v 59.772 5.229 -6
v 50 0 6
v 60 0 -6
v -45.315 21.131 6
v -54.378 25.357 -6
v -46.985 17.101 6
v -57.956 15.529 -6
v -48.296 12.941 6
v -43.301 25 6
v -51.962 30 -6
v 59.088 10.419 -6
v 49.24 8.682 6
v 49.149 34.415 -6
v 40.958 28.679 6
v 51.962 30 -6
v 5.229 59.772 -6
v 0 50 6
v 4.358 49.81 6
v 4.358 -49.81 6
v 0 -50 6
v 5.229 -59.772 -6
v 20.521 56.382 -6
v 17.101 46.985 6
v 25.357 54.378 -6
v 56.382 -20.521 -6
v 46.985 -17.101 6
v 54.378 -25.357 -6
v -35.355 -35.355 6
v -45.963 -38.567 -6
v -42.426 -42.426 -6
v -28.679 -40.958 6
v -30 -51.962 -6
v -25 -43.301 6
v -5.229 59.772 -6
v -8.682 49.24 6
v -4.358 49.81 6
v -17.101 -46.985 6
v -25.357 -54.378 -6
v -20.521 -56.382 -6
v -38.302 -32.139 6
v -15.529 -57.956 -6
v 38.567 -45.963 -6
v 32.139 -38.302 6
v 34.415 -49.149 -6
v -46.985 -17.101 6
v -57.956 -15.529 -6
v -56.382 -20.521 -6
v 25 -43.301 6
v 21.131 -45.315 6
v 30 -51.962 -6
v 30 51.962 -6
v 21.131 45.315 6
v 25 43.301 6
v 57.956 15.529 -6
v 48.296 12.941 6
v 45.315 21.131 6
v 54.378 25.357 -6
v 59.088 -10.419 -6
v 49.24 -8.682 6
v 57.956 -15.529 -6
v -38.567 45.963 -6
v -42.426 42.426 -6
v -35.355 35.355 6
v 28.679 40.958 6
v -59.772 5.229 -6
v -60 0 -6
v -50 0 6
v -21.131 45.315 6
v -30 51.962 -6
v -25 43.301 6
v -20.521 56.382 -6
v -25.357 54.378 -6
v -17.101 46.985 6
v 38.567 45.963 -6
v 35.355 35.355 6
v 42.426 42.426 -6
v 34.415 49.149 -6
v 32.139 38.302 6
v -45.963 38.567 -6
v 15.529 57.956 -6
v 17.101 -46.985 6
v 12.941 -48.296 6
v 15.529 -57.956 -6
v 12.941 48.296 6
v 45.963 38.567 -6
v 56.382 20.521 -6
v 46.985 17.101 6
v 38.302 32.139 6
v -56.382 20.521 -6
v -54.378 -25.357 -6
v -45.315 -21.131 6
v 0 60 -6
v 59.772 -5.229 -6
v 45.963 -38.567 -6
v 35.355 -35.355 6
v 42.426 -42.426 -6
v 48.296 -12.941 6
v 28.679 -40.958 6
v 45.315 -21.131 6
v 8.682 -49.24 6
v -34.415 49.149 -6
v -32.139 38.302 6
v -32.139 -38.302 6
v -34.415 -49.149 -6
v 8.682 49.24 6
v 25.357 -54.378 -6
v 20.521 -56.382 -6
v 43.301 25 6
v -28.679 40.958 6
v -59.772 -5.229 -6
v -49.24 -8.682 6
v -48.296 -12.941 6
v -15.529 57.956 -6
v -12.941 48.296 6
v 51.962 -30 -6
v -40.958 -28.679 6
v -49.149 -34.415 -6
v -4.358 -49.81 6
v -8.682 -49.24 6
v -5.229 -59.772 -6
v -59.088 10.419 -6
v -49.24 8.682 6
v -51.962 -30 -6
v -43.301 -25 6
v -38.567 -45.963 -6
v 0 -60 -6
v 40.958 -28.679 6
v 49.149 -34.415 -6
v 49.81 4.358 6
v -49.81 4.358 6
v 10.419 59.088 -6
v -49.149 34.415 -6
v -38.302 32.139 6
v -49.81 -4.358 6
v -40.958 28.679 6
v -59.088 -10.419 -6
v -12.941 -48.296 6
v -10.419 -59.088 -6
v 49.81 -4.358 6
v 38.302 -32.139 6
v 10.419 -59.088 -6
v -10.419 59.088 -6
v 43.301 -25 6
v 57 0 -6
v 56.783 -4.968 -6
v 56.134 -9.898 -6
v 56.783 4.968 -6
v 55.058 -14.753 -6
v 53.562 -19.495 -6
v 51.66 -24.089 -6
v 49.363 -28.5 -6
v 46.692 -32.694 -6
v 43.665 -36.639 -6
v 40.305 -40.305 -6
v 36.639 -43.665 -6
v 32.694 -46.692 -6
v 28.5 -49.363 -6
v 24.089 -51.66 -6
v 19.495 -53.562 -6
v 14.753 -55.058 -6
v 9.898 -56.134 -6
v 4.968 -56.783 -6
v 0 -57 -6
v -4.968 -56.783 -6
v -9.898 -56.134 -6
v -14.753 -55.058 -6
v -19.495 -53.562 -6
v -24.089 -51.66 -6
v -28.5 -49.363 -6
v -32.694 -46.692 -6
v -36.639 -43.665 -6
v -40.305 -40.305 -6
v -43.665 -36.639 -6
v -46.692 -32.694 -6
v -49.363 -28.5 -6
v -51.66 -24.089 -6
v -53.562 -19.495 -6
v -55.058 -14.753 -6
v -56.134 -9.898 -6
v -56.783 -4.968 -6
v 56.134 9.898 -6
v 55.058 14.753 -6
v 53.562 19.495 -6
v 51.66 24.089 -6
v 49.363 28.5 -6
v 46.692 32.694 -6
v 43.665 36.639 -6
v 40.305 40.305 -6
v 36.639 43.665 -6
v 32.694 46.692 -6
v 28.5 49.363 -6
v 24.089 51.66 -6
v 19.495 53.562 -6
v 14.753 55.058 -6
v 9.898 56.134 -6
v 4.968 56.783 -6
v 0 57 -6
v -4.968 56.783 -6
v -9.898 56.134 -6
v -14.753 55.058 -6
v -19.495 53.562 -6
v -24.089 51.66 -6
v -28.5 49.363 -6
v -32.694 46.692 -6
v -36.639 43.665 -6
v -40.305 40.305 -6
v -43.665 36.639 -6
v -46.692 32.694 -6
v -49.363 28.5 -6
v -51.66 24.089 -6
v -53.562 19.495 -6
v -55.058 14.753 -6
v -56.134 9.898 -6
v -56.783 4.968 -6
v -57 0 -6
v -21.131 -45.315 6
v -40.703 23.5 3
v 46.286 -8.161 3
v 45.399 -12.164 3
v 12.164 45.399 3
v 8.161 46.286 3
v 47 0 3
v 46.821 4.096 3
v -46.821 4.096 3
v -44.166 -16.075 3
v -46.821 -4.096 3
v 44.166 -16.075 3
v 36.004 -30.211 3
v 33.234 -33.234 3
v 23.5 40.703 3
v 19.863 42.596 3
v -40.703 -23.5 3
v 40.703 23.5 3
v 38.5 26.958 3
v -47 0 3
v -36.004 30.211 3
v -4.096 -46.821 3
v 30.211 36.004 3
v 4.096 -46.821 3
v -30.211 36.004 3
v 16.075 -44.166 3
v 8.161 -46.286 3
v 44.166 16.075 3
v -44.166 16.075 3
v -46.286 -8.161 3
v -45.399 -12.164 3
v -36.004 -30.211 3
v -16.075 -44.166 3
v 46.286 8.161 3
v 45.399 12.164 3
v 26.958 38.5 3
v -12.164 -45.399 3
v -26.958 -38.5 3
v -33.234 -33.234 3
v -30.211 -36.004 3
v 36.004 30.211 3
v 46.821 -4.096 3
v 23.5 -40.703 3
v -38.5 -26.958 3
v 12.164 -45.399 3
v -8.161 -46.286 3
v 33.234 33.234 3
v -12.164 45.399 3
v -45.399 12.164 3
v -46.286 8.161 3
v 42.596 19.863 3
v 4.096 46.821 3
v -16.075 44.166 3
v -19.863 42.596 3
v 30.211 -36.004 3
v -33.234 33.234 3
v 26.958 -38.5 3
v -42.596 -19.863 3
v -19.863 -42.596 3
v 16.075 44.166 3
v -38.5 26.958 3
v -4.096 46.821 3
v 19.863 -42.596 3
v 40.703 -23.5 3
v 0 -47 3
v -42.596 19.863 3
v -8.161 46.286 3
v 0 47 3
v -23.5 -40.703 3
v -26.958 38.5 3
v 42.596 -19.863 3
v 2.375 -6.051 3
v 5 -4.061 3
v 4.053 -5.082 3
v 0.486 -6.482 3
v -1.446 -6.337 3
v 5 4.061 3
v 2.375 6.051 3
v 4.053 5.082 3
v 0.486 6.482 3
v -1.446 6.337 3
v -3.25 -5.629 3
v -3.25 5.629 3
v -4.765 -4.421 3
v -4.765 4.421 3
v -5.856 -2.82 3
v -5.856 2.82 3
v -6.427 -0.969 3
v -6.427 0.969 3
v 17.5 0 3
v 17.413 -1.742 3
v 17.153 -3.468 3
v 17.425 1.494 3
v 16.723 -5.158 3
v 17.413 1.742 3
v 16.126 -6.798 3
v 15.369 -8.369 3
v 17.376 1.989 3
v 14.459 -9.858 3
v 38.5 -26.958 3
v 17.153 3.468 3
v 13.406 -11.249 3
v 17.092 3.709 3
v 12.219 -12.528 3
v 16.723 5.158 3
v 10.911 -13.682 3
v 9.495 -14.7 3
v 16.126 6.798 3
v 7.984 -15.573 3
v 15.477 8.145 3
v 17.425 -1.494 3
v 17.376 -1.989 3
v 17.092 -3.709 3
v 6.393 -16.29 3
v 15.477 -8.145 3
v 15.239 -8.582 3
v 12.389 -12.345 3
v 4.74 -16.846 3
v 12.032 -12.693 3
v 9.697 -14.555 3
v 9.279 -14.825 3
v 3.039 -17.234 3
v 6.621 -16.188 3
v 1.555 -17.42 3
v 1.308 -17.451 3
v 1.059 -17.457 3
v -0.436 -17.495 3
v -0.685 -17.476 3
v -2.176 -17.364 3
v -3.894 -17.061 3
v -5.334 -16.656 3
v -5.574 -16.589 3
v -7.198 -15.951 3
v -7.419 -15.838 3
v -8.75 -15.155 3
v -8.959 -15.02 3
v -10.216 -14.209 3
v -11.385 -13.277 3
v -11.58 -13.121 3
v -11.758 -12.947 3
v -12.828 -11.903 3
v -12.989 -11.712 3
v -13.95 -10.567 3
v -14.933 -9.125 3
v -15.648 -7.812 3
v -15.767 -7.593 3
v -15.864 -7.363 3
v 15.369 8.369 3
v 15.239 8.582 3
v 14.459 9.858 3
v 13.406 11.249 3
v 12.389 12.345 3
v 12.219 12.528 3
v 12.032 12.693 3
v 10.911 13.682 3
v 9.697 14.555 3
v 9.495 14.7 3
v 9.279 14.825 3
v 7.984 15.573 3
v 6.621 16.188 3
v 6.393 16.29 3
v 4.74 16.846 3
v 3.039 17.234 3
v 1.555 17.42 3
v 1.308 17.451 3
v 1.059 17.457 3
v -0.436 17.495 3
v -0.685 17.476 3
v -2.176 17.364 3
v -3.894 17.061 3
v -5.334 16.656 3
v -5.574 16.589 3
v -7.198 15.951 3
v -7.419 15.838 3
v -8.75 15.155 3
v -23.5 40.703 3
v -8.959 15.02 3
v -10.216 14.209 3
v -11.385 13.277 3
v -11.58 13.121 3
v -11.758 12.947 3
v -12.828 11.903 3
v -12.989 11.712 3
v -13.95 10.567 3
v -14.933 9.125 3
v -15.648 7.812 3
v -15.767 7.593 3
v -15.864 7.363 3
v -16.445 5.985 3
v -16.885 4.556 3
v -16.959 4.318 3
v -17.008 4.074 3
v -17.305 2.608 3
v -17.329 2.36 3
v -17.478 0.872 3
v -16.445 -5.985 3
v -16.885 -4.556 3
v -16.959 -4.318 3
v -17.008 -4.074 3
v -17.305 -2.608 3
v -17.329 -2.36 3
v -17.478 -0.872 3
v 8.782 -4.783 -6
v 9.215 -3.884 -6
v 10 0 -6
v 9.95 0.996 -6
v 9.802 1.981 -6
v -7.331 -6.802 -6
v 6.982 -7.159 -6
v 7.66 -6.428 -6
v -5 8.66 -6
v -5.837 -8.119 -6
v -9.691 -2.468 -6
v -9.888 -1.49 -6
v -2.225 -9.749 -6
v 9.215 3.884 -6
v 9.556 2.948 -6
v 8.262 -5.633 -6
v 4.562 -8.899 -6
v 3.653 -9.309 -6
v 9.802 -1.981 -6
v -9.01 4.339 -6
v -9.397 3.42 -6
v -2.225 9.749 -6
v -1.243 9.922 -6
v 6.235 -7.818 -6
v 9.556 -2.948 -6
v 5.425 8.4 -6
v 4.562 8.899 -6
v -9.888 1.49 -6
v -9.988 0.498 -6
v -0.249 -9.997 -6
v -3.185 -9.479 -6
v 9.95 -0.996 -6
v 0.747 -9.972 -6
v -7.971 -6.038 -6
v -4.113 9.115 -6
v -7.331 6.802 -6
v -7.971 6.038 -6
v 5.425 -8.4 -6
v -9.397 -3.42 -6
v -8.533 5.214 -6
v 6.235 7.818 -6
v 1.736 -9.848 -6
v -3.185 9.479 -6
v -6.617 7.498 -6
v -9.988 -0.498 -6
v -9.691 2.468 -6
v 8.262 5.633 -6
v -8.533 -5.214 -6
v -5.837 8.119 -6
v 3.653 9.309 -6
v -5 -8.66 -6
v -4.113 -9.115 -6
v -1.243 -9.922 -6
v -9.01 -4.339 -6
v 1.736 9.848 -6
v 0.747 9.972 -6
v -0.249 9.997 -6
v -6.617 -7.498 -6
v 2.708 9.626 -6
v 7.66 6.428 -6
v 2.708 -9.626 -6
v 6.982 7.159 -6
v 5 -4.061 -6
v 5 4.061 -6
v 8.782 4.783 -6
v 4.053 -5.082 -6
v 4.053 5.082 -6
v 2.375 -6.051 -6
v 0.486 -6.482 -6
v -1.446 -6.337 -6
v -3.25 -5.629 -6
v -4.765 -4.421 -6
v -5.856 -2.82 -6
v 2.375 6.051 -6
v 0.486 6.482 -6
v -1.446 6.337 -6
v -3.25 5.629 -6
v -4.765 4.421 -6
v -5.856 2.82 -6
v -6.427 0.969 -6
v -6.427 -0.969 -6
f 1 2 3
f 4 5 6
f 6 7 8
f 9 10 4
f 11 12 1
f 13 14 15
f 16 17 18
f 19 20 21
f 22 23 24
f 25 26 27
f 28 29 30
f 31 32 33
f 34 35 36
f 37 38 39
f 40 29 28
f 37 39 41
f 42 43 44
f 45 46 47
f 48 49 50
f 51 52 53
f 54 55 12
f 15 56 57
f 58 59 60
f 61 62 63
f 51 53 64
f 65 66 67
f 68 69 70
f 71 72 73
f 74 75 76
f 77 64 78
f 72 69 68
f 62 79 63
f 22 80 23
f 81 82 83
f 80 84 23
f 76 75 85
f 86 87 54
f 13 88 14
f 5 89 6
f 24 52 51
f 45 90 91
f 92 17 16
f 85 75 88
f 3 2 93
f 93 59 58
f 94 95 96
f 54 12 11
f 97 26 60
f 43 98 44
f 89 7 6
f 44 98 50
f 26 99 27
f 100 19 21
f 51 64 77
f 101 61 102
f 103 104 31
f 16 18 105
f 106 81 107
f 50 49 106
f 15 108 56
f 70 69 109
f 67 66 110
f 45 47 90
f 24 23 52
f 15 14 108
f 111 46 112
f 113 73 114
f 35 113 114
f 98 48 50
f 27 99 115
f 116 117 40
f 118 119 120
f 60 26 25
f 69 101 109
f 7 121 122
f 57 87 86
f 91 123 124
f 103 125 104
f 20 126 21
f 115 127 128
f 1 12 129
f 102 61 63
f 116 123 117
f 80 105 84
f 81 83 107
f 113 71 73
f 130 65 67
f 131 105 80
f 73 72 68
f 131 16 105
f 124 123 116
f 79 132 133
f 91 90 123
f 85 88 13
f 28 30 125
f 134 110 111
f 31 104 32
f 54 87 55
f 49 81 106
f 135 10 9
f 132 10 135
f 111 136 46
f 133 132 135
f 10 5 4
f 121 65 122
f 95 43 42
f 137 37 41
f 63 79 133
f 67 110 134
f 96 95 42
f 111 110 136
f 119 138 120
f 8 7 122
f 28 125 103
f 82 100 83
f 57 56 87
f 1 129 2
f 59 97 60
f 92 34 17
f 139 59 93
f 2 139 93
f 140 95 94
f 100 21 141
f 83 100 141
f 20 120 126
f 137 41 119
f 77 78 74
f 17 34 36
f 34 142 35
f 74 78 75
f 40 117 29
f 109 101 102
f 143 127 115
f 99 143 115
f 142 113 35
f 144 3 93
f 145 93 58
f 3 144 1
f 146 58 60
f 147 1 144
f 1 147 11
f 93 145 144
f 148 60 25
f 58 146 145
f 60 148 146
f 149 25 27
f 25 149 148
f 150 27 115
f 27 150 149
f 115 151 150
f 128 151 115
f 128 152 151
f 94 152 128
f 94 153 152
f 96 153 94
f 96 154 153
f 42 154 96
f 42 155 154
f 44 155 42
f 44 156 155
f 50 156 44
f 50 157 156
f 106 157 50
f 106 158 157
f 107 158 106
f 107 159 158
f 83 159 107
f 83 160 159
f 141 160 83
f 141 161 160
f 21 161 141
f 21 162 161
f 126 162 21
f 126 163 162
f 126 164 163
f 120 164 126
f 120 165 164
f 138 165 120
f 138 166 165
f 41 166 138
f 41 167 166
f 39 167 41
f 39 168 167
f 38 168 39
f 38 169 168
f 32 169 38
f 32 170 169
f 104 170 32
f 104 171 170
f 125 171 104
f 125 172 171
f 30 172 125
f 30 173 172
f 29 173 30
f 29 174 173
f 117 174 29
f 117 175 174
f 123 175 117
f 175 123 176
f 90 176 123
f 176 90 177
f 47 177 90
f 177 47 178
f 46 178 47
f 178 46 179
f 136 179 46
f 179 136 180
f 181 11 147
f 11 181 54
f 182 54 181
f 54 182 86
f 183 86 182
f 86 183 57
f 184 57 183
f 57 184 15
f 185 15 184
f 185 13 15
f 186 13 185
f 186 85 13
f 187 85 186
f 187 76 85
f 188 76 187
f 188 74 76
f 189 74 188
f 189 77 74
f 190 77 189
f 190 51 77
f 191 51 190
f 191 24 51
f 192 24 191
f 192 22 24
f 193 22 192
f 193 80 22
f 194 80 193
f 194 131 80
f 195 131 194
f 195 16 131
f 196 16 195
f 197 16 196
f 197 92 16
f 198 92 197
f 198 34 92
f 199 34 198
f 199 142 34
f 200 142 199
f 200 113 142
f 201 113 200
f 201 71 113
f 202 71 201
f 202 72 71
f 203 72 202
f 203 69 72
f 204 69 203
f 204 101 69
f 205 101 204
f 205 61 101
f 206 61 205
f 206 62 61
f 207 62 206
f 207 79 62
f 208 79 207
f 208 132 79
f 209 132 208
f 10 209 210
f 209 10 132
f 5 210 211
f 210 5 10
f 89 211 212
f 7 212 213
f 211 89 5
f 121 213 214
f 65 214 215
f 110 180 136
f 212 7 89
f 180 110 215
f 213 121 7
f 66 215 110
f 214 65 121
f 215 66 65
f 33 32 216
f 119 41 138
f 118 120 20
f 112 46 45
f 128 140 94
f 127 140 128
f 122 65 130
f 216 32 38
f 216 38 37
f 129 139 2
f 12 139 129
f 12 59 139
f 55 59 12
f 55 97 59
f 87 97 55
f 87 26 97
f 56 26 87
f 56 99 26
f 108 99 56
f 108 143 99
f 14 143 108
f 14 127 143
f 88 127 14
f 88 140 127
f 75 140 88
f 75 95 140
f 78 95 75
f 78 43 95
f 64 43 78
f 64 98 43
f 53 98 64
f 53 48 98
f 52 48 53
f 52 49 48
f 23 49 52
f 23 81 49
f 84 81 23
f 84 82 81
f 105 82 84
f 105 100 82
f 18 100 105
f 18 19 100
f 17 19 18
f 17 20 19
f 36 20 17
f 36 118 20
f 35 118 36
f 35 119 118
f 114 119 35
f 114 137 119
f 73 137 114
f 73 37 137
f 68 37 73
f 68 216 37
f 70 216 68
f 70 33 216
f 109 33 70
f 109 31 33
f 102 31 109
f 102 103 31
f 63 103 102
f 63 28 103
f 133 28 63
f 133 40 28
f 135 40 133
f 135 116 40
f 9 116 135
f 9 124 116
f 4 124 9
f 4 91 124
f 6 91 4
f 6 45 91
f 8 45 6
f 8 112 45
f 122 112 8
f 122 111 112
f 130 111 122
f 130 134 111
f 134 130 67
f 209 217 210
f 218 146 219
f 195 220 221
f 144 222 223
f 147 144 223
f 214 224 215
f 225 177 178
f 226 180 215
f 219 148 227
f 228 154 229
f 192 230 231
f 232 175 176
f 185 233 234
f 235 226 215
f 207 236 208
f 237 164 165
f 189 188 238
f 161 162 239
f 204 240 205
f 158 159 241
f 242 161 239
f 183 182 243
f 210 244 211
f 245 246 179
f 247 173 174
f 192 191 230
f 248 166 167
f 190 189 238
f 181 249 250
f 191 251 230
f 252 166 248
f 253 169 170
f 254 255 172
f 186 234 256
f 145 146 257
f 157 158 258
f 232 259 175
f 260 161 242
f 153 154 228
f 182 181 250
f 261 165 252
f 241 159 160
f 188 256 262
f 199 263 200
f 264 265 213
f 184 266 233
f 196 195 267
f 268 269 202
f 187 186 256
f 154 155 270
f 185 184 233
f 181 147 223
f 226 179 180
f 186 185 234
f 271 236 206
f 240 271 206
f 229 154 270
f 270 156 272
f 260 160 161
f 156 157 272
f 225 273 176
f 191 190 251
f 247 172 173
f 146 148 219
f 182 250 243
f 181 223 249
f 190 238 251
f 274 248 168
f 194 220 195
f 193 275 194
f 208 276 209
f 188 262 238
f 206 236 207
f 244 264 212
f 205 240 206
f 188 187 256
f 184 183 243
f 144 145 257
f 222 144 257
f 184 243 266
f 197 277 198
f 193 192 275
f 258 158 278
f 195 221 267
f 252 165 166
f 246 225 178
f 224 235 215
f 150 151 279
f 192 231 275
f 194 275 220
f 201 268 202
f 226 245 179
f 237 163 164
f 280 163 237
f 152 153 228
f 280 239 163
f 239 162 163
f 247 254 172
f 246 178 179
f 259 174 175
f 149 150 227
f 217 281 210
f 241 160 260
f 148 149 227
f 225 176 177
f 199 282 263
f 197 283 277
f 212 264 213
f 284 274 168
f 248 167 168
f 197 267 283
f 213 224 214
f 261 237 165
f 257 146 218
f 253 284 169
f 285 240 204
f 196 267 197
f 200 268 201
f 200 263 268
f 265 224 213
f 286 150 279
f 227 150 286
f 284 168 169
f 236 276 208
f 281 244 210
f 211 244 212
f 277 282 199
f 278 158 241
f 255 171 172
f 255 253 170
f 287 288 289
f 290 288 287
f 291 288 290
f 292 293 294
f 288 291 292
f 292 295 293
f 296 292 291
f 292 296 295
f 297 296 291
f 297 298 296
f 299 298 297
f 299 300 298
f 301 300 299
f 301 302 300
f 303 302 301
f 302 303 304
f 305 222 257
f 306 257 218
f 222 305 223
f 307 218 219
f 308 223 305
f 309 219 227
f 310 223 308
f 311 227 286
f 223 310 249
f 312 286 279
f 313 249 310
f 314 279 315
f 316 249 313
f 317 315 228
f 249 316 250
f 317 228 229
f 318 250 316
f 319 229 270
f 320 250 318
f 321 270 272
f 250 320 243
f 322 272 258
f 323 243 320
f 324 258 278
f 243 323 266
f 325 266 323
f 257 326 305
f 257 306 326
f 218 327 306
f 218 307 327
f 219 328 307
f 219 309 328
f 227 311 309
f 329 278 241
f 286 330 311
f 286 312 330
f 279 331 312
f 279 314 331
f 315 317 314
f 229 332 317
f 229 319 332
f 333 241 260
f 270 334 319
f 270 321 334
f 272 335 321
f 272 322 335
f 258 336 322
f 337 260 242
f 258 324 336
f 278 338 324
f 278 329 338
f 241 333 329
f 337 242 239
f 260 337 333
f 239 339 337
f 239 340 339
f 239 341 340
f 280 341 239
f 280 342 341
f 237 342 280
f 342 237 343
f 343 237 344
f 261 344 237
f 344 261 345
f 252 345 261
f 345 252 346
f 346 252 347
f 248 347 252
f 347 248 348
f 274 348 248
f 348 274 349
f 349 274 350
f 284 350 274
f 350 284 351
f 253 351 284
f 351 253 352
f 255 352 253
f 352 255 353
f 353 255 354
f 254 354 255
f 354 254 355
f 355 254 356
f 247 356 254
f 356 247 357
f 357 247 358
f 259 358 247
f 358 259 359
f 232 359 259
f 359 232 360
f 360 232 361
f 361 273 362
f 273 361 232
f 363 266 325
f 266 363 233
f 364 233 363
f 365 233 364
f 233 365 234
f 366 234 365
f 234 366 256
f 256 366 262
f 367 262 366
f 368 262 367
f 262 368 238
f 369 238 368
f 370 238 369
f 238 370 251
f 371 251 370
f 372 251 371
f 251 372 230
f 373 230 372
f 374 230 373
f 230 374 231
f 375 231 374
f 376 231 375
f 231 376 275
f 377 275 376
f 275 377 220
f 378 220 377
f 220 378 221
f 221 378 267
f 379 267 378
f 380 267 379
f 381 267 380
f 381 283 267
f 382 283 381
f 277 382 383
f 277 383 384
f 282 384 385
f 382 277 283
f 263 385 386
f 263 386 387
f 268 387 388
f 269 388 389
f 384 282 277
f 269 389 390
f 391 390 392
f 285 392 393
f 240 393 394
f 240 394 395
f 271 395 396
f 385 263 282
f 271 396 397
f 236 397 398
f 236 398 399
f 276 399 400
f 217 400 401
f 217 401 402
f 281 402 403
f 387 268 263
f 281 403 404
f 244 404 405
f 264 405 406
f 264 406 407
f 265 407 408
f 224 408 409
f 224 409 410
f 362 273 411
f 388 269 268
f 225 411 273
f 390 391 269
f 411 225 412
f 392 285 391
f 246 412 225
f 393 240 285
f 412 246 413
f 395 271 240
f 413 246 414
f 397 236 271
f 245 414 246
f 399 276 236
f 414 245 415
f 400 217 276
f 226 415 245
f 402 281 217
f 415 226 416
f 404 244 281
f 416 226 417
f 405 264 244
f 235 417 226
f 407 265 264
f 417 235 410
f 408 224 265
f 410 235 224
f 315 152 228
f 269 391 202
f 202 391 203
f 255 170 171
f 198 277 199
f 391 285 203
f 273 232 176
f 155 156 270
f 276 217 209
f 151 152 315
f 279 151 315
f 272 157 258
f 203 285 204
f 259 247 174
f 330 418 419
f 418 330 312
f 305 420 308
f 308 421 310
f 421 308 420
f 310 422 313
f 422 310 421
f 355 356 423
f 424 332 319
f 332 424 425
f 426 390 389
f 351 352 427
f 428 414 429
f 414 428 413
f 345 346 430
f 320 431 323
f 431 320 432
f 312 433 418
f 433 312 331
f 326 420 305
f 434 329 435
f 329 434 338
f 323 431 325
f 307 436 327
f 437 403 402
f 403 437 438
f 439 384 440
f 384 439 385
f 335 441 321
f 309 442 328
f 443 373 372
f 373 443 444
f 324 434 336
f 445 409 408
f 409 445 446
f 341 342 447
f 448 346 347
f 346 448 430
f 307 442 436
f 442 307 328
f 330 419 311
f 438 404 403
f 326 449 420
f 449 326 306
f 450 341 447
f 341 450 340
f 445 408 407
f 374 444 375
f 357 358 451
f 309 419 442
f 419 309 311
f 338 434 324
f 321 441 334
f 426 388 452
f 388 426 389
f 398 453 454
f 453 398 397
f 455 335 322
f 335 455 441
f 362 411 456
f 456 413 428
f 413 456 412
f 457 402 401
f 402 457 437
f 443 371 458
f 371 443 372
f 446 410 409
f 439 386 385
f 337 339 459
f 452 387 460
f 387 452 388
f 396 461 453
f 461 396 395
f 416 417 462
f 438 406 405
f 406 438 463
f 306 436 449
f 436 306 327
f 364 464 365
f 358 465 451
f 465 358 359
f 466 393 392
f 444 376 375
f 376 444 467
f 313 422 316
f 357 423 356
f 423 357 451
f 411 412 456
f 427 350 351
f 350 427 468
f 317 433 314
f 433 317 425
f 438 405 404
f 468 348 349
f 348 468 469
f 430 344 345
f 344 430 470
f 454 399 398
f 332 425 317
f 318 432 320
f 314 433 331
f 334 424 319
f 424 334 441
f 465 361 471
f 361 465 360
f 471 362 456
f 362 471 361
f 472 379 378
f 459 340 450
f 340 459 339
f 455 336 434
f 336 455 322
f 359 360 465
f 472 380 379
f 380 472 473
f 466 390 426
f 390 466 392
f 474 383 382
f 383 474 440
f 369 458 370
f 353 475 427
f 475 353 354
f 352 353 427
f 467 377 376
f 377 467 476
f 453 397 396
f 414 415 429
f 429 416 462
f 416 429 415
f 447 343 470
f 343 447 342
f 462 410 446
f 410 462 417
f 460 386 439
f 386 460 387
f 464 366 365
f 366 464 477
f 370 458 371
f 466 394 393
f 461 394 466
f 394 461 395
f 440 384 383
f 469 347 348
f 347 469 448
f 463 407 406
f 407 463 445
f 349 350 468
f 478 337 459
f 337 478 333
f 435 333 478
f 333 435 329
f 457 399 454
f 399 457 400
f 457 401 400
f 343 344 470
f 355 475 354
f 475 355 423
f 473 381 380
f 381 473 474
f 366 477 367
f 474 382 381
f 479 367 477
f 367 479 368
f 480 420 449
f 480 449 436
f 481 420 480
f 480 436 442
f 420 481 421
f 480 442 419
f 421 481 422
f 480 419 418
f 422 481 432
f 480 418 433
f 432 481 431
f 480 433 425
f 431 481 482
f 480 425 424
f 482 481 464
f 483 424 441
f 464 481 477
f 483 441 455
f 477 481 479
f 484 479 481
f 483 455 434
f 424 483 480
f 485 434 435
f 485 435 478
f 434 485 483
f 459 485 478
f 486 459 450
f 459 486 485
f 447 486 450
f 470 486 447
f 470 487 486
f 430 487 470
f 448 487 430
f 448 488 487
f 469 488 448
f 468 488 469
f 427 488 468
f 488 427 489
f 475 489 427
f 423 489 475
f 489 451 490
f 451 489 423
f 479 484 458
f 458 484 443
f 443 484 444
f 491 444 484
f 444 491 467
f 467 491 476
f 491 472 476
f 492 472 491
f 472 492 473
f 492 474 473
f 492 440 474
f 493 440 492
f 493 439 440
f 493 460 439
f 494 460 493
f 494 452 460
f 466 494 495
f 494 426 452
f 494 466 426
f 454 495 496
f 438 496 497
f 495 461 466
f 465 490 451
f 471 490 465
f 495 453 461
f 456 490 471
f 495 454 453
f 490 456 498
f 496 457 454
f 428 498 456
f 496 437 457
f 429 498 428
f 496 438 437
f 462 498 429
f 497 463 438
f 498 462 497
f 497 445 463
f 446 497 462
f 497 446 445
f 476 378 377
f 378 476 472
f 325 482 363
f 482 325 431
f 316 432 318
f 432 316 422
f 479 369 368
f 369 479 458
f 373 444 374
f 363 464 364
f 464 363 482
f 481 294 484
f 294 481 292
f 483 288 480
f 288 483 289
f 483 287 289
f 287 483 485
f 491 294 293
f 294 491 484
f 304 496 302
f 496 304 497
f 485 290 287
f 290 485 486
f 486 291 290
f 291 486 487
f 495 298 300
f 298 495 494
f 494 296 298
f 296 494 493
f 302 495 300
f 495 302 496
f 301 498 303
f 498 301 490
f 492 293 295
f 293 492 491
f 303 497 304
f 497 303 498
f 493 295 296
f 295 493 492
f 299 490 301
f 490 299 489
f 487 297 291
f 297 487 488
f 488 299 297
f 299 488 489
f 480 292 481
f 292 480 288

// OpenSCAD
//EncoderKnob
$fa=05;

union(){

    difference(){
        cylinder(h=12,r1=60,r2=50,center=true);
        translate([0,0,-1.5]){
            cylinder(h=9,r1=60-3,r2=50-3,center=true);
        }
    }
    
    difference(){
        cylinder(h=12,r1=10, r2=20,center=true);
        translate([0,0,-3]){
            cylinder(h=12,r1=6.5,r2=6.5,center=true);
        }
    }
    translate([6.5,0,0]){
        cube([3,10,12],true);
    }
}
